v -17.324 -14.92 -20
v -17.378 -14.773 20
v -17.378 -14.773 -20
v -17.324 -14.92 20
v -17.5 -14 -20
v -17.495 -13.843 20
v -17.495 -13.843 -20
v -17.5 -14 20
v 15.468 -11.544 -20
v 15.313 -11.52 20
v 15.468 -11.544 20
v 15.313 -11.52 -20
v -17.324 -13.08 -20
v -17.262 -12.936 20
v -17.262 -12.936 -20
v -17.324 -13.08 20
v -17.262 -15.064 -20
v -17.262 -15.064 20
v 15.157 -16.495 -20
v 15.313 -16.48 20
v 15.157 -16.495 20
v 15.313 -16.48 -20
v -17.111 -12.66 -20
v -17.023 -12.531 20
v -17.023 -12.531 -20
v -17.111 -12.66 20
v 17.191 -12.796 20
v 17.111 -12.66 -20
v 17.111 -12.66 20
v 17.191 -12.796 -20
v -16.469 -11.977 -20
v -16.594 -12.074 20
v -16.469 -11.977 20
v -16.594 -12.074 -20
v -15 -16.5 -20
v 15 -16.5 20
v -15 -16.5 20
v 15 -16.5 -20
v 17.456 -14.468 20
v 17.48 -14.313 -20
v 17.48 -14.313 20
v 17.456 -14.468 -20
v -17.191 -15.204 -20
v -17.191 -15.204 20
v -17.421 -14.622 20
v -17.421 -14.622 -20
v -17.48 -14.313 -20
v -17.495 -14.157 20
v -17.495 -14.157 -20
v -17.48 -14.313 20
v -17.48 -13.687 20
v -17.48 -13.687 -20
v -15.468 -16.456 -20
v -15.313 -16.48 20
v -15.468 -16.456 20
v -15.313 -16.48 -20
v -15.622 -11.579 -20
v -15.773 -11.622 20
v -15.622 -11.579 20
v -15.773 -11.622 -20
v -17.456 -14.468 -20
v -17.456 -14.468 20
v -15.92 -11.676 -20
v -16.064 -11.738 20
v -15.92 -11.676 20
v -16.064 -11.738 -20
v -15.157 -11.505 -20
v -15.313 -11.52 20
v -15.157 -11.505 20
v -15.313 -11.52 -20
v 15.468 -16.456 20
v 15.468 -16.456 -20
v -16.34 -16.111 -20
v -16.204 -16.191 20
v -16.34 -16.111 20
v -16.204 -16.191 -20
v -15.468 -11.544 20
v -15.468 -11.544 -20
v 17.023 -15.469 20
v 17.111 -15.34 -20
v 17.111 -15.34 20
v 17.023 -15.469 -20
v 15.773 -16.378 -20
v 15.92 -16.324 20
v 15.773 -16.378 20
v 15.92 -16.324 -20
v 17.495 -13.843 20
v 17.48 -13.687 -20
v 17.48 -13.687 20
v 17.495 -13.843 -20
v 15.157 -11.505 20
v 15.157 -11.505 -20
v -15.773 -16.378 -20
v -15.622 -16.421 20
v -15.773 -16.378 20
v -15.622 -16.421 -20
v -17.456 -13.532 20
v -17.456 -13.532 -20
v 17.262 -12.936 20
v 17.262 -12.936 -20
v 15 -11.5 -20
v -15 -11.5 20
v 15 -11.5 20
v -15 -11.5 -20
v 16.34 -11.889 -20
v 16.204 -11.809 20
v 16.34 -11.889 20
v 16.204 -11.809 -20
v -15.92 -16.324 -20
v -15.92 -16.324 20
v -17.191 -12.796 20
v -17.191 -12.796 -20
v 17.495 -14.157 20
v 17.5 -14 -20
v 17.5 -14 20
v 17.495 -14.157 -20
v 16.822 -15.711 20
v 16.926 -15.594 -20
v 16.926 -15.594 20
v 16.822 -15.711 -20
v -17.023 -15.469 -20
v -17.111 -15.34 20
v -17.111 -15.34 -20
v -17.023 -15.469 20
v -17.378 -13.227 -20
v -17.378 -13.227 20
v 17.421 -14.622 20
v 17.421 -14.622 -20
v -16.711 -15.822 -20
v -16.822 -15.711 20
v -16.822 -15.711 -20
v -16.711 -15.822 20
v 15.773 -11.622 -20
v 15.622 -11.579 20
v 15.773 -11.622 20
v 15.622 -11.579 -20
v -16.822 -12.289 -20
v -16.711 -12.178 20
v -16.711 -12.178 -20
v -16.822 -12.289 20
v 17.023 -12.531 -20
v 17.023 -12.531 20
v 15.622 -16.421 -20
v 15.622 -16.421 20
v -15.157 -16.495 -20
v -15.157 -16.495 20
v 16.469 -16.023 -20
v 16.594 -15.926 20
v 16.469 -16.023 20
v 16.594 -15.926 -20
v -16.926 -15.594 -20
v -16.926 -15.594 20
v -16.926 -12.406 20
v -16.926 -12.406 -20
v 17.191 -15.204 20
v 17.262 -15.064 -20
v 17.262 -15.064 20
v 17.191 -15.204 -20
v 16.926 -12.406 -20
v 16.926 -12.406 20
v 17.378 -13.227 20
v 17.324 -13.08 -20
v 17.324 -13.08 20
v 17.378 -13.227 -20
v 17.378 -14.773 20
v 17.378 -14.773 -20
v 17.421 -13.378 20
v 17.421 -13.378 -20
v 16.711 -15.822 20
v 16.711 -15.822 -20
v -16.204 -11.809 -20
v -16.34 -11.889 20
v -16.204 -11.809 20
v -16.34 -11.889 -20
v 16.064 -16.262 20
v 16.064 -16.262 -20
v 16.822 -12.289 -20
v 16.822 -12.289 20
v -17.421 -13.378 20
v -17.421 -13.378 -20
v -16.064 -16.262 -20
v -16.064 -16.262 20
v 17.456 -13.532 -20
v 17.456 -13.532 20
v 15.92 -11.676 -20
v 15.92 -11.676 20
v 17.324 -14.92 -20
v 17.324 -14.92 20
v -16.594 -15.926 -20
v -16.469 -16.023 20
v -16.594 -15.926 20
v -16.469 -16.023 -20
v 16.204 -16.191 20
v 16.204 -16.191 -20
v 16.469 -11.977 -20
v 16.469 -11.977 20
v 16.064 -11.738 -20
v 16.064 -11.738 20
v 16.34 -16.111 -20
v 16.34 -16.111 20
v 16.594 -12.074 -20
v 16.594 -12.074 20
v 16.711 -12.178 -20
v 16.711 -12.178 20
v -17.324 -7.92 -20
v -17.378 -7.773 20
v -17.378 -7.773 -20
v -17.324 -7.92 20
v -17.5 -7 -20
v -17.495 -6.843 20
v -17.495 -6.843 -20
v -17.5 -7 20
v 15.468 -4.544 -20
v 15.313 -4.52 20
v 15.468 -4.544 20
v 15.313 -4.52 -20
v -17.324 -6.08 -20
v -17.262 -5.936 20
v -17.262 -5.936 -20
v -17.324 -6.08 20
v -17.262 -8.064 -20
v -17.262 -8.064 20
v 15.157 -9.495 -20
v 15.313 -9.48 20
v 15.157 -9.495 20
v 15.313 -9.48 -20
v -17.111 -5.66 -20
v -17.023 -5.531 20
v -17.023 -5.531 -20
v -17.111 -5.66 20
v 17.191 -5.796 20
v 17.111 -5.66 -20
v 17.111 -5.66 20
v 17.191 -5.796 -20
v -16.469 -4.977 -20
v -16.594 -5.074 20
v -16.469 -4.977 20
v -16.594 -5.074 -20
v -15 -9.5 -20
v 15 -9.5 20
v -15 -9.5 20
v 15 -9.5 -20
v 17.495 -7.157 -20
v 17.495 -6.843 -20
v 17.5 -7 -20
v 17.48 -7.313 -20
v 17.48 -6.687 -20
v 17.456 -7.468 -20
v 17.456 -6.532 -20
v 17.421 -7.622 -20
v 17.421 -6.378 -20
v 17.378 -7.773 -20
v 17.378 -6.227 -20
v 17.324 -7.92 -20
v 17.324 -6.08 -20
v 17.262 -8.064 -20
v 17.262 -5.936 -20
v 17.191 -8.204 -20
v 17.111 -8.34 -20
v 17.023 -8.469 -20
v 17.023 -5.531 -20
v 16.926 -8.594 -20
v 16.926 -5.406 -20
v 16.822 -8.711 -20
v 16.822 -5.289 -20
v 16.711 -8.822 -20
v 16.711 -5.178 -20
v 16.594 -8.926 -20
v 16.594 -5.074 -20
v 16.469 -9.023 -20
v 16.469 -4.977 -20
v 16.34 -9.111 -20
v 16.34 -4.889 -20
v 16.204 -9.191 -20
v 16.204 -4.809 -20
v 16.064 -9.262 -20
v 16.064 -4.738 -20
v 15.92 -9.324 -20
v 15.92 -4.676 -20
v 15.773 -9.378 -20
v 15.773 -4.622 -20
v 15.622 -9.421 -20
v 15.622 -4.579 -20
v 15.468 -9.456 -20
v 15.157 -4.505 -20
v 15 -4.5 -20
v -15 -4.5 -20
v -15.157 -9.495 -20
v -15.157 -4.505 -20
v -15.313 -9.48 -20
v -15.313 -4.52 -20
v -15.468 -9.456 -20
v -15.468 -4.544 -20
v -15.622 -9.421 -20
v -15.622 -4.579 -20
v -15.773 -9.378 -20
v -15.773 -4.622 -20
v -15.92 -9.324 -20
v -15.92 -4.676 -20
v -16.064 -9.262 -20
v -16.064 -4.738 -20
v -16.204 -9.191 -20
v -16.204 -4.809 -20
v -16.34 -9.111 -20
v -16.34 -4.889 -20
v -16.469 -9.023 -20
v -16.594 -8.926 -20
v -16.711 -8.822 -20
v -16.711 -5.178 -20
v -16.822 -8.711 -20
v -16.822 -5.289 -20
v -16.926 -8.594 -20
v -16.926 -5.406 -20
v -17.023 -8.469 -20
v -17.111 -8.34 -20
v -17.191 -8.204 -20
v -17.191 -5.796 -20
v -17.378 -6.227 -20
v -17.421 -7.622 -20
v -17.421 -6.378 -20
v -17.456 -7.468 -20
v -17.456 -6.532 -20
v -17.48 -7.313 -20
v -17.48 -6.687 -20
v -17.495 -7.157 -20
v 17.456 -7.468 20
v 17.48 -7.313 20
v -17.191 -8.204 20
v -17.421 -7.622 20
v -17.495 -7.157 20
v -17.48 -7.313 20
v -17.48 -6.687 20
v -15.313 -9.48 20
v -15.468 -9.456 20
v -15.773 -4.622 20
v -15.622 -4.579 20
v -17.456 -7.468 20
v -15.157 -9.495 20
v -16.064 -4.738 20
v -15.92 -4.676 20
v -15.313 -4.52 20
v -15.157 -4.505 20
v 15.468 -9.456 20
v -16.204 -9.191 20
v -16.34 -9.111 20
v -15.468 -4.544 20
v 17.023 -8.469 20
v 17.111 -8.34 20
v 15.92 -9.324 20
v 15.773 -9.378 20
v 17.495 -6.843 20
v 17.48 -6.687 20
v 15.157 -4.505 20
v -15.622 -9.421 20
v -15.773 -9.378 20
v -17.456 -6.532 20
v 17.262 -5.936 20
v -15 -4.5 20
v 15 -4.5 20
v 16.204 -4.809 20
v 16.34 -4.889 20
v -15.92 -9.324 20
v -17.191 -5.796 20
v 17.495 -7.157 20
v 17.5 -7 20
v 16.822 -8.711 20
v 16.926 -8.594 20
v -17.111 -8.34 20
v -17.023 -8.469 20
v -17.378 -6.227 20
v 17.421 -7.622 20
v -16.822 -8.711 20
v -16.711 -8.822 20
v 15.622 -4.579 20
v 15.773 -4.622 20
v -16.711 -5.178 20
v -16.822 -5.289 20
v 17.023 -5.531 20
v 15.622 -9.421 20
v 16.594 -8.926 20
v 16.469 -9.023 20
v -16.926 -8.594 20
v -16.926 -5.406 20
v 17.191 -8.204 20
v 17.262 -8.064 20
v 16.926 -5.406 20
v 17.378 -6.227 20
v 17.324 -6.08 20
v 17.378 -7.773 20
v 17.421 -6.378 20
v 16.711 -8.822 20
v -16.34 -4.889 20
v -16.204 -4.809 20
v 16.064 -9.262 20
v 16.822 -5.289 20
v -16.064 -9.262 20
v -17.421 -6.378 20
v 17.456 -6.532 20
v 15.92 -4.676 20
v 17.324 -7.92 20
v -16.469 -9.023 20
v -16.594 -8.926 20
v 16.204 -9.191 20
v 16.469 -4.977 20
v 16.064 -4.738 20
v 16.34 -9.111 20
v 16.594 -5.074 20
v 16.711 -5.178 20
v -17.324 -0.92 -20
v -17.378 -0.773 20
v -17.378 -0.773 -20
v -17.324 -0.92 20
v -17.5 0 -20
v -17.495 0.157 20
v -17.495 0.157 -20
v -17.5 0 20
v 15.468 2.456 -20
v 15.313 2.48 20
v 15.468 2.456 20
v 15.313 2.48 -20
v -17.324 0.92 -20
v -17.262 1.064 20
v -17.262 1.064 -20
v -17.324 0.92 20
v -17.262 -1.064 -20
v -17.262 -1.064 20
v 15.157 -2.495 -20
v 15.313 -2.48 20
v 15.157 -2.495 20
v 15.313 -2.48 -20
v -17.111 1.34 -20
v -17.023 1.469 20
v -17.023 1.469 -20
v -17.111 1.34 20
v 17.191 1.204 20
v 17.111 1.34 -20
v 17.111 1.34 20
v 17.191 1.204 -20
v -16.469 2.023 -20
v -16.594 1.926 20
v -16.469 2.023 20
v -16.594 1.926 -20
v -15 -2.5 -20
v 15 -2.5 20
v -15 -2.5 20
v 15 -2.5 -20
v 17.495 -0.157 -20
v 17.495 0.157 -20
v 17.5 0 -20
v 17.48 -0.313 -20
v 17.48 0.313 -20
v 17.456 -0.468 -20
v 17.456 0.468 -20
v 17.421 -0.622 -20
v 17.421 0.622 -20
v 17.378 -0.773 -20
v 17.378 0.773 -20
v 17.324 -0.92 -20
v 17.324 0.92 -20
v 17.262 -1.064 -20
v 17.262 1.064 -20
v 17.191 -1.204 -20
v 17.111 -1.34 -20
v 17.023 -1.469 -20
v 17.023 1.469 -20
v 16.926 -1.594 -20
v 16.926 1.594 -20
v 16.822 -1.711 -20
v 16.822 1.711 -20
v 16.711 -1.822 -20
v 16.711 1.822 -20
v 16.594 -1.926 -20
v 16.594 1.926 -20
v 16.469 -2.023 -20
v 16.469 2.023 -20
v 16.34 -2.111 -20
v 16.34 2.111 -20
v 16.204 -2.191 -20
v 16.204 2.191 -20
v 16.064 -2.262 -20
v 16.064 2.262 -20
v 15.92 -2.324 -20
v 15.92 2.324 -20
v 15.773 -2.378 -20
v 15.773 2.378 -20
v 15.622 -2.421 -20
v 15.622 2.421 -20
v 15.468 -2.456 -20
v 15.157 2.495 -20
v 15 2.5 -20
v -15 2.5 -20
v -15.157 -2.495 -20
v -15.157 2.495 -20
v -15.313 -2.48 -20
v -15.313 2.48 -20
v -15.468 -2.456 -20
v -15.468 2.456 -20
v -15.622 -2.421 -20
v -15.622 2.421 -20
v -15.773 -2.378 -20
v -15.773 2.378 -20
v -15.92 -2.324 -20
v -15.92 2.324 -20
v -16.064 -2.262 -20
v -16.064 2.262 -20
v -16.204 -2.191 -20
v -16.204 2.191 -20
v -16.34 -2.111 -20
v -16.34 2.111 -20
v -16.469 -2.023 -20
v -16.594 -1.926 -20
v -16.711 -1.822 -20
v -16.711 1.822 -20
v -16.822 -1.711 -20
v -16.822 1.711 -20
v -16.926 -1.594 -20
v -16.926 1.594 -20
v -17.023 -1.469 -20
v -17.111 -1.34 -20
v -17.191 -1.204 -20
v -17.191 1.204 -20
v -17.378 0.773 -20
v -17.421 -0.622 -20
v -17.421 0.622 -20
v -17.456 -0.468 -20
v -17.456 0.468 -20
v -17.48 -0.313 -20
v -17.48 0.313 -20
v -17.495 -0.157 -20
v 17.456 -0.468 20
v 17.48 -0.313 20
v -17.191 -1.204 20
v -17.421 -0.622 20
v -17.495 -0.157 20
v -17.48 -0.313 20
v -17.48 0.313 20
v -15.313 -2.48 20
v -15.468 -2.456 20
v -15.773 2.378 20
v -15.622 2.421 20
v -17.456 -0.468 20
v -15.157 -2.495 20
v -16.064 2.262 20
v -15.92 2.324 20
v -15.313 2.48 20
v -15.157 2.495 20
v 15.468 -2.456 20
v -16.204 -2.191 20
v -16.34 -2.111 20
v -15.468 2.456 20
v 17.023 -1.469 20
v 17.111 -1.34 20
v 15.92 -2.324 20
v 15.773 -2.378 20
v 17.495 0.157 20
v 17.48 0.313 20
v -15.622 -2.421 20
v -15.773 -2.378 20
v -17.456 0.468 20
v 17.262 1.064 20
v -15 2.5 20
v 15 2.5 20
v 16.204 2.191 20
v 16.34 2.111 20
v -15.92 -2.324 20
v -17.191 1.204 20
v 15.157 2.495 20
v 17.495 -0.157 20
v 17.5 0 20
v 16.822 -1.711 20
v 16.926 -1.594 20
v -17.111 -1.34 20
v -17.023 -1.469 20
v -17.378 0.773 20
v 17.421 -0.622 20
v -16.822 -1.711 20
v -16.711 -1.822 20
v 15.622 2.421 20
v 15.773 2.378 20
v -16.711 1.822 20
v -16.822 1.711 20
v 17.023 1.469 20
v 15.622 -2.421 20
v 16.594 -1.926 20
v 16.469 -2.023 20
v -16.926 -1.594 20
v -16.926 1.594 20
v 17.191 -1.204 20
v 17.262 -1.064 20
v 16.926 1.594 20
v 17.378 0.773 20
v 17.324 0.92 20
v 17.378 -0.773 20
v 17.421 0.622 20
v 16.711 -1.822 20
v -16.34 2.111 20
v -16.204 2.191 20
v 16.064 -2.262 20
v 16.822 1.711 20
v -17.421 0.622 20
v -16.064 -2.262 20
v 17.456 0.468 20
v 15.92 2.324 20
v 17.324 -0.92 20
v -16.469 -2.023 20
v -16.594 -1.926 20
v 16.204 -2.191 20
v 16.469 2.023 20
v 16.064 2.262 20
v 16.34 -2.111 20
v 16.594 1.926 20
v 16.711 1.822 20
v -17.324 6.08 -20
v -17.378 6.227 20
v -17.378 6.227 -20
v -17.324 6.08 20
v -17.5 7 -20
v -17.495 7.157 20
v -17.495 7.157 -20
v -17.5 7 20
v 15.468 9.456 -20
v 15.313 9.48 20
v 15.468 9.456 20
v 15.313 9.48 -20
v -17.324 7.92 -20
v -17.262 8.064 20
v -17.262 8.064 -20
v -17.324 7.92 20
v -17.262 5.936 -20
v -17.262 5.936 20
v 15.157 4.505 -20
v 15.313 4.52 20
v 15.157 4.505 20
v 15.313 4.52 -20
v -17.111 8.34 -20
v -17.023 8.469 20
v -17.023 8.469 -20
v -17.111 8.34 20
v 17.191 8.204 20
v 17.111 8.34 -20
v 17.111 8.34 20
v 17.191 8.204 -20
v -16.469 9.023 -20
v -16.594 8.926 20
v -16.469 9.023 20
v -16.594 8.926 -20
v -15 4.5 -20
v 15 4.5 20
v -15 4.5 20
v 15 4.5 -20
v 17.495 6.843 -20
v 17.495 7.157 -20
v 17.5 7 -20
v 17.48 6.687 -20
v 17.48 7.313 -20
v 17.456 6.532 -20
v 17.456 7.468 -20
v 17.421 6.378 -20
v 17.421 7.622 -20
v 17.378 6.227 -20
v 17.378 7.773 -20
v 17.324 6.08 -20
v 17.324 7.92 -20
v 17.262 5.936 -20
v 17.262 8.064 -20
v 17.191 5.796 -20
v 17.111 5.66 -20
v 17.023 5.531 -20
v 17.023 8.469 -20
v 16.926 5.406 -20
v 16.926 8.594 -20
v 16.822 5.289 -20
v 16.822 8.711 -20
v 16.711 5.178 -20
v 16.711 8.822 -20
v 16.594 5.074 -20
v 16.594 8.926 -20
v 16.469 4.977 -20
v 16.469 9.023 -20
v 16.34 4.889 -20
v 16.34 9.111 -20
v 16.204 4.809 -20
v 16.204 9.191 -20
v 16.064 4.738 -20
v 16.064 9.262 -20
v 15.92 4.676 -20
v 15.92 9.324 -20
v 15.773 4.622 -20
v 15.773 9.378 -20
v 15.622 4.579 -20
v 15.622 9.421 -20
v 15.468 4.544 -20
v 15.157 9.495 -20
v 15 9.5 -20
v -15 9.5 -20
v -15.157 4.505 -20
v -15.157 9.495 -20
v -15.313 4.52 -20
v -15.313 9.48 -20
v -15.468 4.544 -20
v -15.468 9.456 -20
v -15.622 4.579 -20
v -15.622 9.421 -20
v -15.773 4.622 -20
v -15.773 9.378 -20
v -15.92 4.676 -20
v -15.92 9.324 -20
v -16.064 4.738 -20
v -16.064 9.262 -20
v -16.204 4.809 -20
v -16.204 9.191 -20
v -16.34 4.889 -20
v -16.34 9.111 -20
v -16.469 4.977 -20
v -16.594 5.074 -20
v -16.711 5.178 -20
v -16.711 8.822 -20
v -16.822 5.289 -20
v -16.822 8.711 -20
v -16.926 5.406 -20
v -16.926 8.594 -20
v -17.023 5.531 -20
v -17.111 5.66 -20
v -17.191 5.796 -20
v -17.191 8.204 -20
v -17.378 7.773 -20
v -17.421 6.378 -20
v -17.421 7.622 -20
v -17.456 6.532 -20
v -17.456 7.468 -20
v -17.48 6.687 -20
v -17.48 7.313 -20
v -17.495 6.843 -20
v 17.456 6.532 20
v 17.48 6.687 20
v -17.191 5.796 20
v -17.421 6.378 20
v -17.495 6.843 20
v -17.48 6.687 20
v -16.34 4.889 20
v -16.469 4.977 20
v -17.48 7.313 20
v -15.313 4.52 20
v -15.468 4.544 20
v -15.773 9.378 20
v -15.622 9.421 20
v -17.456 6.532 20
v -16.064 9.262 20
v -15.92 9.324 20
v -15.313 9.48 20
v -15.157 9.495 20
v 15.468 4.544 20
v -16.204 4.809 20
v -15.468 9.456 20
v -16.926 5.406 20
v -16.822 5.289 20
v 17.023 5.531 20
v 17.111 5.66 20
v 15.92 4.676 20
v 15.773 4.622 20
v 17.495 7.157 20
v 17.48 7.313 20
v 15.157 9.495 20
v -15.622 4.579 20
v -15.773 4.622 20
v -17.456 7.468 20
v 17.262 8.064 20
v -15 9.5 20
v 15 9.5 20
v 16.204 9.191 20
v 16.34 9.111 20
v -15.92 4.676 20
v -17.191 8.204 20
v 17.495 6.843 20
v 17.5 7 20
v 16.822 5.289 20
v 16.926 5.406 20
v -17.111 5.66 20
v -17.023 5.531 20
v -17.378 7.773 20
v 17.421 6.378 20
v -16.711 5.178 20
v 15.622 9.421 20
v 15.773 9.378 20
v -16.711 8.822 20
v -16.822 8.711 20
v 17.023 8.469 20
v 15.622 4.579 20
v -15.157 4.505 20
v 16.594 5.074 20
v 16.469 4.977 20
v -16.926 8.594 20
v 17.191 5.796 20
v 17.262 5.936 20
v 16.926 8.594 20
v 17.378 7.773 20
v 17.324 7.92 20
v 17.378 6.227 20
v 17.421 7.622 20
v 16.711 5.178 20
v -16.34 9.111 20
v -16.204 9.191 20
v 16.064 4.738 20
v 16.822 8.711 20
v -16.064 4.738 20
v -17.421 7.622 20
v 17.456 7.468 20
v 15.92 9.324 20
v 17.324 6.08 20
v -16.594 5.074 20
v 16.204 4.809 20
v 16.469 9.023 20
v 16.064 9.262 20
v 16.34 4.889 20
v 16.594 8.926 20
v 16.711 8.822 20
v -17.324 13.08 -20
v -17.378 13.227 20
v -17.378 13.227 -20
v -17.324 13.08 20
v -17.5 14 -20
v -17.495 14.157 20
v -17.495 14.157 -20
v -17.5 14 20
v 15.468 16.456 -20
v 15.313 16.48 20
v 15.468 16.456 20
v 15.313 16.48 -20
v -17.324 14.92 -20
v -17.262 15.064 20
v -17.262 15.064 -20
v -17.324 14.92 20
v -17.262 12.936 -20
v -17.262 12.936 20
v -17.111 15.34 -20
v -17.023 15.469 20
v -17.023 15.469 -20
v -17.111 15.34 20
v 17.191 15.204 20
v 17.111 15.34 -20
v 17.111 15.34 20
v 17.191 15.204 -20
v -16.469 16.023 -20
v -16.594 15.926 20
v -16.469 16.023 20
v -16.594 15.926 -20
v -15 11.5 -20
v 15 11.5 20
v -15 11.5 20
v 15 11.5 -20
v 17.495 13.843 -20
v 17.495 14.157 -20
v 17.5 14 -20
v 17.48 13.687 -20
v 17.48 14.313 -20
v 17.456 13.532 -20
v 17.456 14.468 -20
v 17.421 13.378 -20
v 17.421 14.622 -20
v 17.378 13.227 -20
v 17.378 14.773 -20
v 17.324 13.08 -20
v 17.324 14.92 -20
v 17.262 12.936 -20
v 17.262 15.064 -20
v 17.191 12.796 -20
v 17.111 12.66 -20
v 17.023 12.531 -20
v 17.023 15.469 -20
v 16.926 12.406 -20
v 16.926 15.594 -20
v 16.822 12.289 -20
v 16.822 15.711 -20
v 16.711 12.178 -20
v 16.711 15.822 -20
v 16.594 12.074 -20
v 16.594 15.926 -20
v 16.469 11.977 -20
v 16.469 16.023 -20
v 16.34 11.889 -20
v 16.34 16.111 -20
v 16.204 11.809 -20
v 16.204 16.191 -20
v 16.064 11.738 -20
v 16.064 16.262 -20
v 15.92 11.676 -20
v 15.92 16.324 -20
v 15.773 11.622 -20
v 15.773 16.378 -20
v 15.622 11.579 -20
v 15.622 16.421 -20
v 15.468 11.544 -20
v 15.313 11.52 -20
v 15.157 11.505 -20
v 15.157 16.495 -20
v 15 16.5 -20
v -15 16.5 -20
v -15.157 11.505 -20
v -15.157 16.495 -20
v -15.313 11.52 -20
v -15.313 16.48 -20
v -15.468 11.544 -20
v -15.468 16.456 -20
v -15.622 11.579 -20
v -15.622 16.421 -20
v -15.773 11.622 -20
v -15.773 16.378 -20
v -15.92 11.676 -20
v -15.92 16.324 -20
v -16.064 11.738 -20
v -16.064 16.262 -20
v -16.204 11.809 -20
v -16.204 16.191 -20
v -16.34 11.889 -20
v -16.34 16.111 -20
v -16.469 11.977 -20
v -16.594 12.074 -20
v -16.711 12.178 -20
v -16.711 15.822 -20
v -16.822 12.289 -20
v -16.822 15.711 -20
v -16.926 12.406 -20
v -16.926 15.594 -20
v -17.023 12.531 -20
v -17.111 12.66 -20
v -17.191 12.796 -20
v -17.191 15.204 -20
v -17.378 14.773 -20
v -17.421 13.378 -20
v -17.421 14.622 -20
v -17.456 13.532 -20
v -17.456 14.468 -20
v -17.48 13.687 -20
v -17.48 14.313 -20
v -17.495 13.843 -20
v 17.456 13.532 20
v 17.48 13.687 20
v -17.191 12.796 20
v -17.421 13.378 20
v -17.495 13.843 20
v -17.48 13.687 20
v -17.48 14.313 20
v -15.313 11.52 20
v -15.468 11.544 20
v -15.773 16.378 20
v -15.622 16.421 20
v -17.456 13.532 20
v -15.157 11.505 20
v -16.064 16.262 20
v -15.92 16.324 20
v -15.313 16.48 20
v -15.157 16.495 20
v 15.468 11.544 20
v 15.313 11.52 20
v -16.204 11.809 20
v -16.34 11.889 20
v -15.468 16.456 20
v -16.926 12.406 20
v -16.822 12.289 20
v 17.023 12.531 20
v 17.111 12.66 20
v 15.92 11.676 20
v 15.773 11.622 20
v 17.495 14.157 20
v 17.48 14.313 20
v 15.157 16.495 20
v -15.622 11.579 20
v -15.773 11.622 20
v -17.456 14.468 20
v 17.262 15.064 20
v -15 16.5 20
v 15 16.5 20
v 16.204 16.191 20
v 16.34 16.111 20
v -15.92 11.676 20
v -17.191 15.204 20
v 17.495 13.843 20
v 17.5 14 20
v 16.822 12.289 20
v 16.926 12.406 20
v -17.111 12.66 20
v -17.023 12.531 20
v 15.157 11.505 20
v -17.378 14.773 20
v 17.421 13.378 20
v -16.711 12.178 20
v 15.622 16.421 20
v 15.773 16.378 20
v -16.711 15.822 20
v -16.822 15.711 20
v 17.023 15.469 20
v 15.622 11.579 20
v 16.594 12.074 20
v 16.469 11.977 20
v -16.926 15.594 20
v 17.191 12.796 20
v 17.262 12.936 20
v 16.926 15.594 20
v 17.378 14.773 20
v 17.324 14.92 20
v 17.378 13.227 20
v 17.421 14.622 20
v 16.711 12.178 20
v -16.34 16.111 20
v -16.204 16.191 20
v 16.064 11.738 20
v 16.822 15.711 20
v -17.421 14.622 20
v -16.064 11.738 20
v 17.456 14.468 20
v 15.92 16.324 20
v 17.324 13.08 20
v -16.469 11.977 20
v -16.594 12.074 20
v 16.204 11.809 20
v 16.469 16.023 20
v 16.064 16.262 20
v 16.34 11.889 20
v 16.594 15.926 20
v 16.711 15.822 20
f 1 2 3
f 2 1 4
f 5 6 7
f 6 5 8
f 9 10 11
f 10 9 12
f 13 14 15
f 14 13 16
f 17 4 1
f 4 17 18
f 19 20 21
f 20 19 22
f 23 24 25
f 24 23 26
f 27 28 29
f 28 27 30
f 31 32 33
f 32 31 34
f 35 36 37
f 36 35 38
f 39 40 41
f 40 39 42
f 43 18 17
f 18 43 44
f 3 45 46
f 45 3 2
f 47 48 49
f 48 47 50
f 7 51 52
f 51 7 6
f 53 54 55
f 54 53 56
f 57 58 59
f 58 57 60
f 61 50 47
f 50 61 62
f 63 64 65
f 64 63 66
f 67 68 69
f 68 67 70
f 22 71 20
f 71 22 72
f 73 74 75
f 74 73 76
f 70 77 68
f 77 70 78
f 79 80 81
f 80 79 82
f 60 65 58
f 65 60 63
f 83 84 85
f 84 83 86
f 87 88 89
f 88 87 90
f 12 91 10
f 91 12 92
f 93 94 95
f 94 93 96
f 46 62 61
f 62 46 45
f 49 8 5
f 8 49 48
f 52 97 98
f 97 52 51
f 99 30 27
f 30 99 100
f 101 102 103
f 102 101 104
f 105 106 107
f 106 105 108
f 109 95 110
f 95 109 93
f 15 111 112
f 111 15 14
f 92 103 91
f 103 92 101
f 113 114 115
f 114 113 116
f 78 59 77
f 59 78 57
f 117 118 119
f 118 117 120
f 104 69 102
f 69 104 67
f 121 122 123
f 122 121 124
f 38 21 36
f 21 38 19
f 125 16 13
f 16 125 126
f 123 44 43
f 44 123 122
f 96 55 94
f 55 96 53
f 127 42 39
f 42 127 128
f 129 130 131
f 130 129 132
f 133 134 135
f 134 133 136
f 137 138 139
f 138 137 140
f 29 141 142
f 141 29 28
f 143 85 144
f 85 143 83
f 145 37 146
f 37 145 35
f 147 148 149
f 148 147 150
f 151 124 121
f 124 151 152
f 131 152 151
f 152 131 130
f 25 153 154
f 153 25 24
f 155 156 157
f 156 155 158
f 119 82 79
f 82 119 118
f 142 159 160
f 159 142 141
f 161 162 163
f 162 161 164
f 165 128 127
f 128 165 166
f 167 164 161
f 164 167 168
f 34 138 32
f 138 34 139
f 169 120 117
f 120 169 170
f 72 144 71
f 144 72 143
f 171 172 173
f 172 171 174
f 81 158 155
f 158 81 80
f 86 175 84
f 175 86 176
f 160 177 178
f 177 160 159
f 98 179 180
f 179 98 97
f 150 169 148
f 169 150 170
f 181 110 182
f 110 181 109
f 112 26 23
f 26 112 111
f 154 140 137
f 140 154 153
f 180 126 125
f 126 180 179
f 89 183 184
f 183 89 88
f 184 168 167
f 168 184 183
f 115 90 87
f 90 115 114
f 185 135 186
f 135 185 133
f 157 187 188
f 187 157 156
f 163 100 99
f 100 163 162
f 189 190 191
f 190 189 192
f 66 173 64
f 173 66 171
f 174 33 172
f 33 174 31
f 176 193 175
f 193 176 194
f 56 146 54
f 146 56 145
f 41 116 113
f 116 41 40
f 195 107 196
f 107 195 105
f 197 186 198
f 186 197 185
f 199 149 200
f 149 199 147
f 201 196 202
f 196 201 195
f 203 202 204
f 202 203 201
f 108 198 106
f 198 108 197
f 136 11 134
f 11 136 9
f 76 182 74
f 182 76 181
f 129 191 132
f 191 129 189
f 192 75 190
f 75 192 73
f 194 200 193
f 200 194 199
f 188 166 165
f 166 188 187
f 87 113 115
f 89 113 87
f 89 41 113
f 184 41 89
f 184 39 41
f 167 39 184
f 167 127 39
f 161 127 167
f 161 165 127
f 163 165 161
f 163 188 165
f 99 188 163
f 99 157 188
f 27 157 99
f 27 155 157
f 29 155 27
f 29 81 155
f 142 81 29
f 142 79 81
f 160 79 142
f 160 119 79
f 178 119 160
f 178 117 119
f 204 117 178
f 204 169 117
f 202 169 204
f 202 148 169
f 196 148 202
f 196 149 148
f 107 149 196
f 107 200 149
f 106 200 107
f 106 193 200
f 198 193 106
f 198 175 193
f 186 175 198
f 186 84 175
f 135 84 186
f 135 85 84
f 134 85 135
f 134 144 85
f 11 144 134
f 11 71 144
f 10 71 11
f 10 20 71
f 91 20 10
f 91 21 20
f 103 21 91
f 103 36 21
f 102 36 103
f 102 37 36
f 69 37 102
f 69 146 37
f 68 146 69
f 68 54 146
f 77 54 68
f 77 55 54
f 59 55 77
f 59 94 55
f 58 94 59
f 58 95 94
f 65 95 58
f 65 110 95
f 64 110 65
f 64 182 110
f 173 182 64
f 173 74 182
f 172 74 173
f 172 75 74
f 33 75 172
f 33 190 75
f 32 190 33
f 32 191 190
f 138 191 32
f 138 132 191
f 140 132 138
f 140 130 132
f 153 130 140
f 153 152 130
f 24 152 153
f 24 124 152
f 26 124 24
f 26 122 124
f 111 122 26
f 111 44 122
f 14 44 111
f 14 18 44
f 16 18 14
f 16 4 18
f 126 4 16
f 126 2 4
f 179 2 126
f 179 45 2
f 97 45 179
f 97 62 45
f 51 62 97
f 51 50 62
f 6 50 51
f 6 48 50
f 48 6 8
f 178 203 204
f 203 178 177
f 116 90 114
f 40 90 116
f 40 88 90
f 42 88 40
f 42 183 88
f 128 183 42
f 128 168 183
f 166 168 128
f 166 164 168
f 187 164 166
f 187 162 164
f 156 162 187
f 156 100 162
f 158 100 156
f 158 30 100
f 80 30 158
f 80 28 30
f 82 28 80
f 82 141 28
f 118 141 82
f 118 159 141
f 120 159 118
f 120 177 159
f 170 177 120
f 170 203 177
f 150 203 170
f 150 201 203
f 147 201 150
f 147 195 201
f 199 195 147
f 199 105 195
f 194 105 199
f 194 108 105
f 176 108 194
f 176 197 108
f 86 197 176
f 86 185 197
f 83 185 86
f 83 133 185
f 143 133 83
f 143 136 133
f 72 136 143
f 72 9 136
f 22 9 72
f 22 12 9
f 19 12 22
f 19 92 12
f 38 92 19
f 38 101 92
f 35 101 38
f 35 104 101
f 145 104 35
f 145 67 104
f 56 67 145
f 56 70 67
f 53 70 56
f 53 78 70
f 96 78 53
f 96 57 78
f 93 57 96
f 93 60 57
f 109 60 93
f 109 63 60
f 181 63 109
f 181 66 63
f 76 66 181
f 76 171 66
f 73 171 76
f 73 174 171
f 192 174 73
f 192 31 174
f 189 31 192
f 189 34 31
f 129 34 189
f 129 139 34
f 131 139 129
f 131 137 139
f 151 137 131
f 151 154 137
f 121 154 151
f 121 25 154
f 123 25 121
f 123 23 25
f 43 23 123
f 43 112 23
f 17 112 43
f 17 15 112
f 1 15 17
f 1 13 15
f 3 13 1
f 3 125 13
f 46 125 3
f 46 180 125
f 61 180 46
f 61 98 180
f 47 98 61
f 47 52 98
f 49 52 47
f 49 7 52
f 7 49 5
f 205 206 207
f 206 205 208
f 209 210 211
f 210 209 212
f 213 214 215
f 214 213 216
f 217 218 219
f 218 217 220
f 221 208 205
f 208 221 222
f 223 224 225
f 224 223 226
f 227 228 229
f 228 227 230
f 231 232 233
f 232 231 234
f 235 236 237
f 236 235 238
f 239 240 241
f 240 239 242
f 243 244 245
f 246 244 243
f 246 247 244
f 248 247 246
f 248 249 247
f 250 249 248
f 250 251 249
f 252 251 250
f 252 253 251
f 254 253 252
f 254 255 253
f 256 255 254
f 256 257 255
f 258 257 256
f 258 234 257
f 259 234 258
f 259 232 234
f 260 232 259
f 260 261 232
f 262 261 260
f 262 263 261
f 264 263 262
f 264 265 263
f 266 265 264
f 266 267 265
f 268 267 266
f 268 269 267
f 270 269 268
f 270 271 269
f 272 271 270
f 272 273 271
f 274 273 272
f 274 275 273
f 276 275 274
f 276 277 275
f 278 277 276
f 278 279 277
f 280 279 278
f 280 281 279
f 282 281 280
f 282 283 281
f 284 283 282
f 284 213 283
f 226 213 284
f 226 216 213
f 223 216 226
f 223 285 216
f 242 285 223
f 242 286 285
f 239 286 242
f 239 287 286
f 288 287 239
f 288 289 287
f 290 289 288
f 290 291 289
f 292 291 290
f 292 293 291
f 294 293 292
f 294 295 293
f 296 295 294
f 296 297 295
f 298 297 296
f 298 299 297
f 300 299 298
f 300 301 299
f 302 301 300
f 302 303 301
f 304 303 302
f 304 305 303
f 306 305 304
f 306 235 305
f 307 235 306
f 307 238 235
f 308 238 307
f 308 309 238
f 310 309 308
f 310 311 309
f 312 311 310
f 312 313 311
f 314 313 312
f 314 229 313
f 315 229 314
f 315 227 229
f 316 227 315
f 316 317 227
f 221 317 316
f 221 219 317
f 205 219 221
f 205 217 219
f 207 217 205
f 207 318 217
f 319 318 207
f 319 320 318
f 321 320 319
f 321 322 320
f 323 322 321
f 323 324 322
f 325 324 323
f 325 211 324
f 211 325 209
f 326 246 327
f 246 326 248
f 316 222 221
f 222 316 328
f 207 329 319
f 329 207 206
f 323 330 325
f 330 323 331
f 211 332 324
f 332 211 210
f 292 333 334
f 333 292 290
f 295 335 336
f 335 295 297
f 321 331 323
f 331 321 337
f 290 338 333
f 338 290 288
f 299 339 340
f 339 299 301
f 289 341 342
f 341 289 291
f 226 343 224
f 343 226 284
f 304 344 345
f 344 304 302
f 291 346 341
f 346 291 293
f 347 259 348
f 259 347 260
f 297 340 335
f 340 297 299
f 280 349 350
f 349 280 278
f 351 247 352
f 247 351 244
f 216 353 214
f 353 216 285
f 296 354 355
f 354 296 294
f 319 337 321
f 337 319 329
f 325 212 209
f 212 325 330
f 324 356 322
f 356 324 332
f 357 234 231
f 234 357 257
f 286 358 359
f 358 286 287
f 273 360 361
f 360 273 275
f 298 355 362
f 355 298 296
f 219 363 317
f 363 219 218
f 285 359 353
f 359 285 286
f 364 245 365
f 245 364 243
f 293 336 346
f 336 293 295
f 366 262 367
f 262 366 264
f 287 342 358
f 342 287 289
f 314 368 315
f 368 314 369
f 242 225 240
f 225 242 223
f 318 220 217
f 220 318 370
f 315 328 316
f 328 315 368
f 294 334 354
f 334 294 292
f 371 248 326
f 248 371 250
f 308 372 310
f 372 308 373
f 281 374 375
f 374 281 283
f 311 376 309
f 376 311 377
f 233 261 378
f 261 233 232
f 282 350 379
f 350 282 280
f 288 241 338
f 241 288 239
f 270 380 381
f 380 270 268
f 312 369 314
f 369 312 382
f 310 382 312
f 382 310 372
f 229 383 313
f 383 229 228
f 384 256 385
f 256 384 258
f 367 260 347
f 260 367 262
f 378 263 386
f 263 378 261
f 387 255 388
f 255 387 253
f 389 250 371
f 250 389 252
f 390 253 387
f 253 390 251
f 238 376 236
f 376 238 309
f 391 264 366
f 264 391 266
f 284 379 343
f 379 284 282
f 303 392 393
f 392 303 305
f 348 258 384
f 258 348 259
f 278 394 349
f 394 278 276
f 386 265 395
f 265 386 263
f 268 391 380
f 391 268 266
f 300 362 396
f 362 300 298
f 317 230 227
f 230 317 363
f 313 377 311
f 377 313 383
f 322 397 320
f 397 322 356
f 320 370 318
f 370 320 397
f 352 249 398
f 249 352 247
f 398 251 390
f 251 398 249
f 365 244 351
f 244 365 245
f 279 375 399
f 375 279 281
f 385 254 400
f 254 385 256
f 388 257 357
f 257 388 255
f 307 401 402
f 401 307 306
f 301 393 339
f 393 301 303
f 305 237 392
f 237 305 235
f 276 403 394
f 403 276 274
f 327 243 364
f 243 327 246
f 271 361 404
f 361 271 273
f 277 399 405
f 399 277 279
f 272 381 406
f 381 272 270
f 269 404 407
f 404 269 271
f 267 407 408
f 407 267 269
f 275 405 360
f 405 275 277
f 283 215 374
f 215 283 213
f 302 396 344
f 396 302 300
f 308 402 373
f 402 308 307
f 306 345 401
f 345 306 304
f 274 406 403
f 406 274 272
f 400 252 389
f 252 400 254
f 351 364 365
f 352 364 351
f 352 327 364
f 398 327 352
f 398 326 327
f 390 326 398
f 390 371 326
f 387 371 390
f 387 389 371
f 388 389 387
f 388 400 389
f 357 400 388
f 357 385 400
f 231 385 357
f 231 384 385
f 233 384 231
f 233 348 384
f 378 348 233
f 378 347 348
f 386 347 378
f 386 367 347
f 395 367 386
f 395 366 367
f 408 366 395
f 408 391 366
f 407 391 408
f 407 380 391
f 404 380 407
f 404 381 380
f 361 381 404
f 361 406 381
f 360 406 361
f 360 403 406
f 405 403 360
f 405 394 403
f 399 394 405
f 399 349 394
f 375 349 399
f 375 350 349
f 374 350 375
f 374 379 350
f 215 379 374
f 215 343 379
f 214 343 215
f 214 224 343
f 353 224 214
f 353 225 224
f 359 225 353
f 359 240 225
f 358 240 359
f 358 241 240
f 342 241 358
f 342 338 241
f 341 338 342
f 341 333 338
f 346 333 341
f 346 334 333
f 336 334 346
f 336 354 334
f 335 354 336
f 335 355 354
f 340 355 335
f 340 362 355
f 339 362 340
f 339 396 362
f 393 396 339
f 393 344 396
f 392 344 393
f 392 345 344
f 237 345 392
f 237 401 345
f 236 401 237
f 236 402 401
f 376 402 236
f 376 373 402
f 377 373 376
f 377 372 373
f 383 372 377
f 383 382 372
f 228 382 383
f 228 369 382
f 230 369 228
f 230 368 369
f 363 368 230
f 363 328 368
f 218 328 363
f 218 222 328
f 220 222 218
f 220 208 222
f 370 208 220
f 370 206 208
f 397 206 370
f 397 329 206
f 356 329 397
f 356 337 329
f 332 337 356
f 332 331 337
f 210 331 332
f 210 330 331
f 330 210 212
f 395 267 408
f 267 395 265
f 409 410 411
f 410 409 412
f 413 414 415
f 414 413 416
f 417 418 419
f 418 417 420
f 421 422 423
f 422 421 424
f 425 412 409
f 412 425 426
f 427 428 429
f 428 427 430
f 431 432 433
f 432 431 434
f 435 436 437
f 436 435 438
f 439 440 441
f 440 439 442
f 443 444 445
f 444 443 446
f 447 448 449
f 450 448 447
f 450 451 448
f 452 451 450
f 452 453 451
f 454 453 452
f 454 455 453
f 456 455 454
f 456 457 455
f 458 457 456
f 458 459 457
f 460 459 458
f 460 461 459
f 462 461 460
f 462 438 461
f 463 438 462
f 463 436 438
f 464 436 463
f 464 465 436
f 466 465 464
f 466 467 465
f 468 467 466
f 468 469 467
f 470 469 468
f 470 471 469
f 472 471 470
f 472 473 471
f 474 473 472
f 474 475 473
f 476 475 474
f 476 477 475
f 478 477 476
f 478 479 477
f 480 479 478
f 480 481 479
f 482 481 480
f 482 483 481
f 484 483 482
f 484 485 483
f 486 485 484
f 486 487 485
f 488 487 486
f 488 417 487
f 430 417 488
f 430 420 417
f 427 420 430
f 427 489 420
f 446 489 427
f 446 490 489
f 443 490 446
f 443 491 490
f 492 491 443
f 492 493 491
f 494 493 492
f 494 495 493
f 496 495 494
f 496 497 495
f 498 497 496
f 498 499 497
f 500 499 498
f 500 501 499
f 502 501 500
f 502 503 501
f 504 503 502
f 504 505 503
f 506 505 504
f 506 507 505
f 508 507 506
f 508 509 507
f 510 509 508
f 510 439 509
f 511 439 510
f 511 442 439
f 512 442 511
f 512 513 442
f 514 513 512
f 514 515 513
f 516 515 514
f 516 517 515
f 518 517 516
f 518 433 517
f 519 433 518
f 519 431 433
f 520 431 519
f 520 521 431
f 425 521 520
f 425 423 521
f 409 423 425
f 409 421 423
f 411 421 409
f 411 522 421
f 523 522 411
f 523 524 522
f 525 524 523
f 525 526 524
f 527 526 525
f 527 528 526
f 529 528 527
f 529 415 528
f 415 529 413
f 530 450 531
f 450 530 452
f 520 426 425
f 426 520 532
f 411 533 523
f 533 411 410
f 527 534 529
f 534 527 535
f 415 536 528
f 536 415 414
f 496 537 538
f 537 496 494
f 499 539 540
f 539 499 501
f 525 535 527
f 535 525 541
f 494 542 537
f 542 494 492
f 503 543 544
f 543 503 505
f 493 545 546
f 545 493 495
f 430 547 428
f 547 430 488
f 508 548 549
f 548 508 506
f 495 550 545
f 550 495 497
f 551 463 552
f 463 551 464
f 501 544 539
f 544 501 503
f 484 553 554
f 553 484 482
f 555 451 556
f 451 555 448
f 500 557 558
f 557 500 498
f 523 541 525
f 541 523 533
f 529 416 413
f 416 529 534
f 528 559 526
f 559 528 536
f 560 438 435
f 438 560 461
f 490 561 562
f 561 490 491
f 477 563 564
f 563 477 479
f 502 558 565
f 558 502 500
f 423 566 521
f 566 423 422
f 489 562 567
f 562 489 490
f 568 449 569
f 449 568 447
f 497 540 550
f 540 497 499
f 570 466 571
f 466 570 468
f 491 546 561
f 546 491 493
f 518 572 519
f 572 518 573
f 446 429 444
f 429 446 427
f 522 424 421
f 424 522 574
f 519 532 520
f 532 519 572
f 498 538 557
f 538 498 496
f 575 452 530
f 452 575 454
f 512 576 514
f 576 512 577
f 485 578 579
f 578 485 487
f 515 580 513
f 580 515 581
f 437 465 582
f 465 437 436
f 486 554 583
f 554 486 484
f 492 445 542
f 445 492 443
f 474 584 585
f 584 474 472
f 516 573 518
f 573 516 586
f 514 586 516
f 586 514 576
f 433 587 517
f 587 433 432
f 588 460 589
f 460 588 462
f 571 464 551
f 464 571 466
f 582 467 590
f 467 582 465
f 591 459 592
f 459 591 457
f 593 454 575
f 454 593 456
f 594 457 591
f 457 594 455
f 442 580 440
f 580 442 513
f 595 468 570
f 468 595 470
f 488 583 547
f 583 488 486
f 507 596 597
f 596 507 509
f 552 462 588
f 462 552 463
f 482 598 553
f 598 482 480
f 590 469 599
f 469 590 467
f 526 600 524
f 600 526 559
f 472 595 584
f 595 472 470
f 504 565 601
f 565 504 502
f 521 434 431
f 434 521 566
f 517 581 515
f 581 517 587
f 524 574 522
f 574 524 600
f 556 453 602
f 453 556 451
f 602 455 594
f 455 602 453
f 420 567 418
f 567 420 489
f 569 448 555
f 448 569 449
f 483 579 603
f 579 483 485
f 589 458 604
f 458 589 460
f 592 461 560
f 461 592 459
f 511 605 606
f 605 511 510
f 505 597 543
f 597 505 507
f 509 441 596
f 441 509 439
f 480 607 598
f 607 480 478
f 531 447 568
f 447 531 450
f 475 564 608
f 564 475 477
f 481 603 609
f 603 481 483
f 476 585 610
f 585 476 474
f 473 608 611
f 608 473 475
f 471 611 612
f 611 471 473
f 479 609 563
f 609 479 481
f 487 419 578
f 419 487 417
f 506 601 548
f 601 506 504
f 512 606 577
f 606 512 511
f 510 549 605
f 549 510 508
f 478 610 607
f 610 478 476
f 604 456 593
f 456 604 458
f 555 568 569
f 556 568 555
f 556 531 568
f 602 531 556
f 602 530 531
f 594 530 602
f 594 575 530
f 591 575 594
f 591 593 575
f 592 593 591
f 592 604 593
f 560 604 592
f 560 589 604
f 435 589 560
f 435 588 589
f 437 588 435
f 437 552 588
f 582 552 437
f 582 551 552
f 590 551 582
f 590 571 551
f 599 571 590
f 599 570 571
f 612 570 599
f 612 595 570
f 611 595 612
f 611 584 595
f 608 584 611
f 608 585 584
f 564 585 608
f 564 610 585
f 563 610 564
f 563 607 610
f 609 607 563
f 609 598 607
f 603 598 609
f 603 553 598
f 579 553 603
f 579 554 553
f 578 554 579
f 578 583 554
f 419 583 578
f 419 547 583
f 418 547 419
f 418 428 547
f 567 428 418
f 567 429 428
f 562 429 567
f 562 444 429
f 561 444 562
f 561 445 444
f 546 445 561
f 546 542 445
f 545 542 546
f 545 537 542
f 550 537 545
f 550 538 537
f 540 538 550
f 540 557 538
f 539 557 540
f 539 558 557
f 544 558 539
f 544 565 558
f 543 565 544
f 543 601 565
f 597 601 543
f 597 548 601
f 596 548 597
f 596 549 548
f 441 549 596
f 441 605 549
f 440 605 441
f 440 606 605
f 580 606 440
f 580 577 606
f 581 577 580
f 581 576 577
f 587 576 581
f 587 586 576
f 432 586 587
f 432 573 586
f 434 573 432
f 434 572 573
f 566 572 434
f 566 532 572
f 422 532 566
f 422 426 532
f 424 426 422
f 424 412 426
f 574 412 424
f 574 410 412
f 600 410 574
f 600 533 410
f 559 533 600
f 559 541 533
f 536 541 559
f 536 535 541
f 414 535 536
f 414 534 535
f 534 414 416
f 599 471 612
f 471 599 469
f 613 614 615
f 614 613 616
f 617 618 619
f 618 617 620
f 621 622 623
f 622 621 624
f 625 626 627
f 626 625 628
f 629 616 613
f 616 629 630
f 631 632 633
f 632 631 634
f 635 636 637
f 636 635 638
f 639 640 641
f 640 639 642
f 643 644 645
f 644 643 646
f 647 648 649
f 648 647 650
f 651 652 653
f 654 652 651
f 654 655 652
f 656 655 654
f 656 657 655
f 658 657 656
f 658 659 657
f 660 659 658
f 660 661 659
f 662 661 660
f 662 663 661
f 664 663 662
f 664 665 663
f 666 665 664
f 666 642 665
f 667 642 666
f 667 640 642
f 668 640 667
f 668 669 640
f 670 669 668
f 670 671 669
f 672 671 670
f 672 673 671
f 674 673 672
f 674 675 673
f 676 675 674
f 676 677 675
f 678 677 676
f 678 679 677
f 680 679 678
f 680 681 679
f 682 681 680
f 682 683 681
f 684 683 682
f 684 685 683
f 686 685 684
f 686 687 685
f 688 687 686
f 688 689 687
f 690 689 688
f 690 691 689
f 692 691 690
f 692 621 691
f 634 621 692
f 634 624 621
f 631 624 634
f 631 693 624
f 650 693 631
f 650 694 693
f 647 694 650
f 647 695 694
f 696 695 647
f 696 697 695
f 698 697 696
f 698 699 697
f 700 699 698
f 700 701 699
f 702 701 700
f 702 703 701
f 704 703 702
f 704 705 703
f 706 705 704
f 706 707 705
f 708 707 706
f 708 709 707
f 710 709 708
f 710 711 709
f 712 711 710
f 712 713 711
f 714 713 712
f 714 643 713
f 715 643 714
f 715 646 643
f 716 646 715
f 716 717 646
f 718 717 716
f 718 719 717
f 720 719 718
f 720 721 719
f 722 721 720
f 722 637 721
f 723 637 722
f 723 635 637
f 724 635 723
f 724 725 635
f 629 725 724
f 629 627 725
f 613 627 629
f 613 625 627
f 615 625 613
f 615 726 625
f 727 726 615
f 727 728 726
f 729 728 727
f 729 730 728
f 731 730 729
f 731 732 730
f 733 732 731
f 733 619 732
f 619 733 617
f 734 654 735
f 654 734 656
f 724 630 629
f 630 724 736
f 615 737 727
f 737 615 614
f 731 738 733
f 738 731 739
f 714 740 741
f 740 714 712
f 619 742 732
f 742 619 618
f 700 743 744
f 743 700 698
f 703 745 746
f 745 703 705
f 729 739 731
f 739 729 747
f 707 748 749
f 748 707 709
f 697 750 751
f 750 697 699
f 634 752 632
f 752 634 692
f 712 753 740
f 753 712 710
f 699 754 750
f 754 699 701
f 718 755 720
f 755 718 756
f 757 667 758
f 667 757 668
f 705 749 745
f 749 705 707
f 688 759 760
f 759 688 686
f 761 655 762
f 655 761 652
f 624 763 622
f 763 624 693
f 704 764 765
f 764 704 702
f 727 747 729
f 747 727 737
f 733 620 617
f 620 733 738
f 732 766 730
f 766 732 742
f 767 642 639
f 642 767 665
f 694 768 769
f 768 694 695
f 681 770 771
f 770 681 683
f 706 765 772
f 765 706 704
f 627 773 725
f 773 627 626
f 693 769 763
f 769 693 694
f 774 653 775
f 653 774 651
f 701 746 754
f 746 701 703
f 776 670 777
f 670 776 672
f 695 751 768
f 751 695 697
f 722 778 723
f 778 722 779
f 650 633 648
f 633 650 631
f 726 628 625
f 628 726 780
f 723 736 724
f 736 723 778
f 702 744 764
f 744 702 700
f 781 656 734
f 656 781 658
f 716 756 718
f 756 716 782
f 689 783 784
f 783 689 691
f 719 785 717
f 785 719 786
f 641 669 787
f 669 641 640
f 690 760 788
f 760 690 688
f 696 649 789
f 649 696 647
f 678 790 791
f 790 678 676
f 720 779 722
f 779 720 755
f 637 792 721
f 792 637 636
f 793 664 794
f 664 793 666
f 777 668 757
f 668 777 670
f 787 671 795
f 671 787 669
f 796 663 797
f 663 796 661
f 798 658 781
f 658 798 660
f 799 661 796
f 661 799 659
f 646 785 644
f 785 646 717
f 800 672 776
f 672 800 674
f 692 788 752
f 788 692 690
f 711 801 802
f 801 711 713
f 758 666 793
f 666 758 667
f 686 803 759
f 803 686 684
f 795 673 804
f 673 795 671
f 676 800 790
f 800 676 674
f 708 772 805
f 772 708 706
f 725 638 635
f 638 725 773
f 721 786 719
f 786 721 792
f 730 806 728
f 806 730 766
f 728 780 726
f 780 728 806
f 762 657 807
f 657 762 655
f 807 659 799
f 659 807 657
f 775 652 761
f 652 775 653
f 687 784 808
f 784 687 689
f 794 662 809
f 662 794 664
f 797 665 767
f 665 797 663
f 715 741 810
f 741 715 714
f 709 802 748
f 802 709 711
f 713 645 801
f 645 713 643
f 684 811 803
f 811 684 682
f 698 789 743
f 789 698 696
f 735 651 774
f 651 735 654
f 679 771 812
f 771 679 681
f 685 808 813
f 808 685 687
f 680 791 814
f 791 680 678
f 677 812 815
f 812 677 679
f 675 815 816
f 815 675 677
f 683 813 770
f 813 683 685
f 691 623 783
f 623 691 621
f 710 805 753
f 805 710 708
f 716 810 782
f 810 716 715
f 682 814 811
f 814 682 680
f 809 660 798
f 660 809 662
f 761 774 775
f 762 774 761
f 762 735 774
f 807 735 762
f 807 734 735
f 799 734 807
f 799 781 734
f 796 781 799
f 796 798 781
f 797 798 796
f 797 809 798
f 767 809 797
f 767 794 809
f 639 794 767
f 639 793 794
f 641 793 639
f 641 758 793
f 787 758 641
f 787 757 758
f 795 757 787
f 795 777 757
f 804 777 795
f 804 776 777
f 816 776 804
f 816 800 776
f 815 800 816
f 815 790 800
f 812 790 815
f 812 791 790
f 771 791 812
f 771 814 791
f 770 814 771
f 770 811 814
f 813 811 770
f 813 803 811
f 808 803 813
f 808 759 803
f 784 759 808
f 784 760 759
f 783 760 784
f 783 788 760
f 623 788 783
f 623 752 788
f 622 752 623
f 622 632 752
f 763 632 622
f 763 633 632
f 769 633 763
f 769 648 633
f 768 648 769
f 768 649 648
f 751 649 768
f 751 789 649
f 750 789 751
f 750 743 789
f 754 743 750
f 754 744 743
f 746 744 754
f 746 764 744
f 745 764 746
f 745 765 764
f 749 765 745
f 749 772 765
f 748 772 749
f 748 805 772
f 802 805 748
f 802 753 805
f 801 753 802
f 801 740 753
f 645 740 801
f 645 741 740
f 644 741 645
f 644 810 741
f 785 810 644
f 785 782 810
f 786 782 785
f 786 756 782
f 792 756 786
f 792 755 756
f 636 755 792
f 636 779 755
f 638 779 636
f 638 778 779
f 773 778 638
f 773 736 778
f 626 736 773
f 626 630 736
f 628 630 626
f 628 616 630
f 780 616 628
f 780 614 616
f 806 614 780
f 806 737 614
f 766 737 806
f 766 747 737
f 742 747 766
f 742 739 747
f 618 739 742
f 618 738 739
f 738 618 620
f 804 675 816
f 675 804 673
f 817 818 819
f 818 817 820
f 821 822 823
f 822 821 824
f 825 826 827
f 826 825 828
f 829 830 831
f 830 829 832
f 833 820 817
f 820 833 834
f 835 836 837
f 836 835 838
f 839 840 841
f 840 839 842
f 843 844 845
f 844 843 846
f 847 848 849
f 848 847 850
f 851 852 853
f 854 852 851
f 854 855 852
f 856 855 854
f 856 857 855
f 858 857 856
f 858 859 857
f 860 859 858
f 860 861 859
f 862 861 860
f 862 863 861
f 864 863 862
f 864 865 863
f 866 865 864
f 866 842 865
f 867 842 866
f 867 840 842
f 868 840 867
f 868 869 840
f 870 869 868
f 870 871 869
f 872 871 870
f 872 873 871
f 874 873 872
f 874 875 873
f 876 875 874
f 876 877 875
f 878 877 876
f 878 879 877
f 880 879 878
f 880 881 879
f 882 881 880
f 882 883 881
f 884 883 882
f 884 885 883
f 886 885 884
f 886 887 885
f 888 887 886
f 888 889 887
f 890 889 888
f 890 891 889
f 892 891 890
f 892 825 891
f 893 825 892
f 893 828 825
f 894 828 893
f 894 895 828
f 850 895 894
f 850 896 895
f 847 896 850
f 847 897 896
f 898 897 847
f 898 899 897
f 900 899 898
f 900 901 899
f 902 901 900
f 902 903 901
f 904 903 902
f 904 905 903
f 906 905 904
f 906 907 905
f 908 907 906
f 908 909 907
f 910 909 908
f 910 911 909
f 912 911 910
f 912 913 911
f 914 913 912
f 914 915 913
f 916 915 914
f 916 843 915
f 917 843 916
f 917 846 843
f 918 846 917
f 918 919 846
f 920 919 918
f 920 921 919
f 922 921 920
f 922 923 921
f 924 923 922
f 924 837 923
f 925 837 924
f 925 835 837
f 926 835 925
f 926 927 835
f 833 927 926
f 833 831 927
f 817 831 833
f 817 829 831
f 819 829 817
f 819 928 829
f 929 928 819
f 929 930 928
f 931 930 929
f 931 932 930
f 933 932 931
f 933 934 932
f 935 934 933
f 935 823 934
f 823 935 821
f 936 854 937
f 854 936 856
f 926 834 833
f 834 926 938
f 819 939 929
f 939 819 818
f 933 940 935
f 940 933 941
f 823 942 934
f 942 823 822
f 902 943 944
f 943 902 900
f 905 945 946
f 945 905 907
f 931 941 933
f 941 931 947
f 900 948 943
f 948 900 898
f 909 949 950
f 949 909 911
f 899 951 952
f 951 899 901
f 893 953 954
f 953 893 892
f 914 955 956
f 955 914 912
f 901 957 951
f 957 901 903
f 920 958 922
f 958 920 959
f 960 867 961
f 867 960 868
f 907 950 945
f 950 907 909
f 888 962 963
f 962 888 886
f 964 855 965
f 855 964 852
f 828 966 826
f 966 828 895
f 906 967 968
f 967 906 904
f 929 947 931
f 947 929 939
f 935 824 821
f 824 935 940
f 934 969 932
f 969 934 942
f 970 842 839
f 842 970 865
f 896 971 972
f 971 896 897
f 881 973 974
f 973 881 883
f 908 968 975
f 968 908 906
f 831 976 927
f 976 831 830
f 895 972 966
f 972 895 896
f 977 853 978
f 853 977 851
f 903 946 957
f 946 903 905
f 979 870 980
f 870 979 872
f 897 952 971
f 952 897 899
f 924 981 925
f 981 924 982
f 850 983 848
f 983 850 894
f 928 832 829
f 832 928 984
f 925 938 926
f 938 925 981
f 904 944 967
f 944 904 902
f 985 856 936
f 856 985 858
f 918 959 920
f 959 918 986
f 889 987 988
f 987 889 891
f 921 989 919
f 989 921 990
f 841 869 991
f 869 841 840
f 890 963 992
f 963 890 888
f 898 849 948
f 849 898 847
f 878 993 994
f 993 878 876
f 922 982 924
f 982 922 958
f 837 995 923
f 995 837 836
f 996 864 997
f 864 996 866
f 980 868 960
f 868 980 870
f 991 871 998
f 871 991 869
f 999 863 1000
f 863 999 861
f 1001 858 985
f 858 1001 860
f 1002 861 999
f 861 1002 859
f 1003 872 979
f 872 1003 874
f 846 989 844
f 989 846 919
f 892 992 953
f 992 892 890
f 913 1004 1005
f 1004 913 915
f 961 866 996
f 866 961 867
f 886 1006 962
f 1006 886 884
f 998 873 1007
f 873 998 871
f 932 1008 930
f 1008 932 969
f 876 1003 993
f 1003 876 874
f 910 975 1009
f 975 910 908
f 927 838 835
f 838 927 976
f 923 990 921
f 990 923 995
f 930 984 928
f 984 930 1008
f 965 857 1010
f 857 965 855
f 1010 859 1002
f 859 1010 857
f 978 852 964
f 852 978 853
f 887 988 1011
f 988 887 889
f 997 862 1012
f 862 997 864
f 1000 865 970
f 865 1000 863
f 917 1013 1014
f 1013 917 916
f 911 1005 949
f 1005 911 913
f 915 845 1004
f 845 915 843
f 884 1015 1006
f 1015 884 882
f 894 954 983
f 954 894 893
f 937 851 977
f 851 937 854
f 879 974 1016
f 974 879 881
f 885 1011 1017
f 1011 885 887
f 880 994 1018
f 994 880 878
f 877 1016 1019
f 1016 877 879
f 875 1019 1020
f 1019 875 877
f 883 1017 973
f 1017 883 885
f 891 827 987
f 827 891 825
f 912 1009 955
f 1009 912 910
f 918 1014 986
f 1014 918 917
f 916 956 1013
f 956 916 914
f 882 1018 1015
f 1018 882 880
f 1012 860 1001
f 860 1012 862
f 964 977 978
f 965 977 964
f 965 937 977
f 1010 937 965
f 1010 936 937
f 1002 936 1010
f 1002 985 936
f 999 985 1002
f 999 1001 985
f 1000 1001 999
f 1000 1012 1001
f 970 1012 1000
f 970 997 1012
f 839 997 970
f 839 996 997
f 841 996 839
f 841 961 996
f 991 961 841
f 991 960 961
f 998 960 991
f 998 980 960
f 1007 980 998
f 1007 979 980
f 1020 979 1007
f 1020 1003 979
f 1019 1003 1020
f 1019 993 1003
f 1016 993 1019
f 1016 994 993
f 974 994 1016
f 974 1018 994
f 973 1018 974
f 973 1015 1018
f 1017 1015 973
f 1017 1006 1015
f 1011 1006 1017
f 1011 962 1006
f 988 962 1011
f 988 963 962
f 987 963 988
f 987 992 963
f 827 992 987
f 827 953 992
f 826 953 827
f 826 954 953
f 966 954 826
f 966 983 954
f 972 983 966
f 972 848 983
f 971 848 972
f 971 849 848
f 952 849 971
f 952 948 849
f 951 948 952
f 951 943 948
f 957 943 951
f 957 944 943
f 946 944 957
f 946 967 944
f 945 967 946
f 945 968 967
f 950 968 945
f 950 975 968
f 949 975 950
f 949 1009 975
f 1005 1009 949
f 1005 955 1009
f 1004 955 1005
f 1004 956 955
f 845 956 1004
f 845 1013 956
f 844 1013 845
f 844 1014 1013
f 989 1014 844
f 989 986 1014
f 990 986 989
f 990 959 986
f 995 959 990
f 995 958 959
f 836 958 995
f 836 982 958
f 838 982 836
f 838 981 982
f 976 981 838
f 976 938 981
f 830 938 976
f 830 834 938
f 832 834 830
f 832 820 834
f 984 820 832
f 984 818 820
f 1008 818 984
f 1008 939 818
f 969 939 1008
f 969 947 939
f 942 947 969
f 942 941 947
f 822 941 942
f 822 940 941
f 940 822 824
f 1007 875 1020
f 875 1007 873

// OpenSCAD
// speaker_asset_main_diameter


module speakerGrid(x_size, section_count, section_y_size, section_y_margin) {
    y_size = section_count * (section_y_size + section_y_margin) - section_y_margin;

    translate([0, - y_size / 2, 0])
    for(offset = [0 : section_count - 1])
        translate([
            0,
            offset * (section_y_size + section_y_margin) + section_y_size / 2,
            0
        ])
            section(width = section_y_size, length = x_size, center = true, $fn = 100);
}


module section(width, length, center = true) {
    height = 40;
    translate([0, 0, -height / 2]) {
        if (center) {
            translate([-length / 2, 0, 0])
                hull() {
                    cylinder(d = width, h = height);
                    translate([length, 0, 0])
                        cylinder(d = width, h = height);
                }
        } else {
            hull() {
                cylinder(d = width, h = height);
                translate([length, 0, 0])
                    cylinder(d = width, h = height);
            }
        }
    }
}


speakerGrid(
    x_size = 30,
    section_count = 5,
    section_y_size = 5,
    section_y_margin = 2
);
